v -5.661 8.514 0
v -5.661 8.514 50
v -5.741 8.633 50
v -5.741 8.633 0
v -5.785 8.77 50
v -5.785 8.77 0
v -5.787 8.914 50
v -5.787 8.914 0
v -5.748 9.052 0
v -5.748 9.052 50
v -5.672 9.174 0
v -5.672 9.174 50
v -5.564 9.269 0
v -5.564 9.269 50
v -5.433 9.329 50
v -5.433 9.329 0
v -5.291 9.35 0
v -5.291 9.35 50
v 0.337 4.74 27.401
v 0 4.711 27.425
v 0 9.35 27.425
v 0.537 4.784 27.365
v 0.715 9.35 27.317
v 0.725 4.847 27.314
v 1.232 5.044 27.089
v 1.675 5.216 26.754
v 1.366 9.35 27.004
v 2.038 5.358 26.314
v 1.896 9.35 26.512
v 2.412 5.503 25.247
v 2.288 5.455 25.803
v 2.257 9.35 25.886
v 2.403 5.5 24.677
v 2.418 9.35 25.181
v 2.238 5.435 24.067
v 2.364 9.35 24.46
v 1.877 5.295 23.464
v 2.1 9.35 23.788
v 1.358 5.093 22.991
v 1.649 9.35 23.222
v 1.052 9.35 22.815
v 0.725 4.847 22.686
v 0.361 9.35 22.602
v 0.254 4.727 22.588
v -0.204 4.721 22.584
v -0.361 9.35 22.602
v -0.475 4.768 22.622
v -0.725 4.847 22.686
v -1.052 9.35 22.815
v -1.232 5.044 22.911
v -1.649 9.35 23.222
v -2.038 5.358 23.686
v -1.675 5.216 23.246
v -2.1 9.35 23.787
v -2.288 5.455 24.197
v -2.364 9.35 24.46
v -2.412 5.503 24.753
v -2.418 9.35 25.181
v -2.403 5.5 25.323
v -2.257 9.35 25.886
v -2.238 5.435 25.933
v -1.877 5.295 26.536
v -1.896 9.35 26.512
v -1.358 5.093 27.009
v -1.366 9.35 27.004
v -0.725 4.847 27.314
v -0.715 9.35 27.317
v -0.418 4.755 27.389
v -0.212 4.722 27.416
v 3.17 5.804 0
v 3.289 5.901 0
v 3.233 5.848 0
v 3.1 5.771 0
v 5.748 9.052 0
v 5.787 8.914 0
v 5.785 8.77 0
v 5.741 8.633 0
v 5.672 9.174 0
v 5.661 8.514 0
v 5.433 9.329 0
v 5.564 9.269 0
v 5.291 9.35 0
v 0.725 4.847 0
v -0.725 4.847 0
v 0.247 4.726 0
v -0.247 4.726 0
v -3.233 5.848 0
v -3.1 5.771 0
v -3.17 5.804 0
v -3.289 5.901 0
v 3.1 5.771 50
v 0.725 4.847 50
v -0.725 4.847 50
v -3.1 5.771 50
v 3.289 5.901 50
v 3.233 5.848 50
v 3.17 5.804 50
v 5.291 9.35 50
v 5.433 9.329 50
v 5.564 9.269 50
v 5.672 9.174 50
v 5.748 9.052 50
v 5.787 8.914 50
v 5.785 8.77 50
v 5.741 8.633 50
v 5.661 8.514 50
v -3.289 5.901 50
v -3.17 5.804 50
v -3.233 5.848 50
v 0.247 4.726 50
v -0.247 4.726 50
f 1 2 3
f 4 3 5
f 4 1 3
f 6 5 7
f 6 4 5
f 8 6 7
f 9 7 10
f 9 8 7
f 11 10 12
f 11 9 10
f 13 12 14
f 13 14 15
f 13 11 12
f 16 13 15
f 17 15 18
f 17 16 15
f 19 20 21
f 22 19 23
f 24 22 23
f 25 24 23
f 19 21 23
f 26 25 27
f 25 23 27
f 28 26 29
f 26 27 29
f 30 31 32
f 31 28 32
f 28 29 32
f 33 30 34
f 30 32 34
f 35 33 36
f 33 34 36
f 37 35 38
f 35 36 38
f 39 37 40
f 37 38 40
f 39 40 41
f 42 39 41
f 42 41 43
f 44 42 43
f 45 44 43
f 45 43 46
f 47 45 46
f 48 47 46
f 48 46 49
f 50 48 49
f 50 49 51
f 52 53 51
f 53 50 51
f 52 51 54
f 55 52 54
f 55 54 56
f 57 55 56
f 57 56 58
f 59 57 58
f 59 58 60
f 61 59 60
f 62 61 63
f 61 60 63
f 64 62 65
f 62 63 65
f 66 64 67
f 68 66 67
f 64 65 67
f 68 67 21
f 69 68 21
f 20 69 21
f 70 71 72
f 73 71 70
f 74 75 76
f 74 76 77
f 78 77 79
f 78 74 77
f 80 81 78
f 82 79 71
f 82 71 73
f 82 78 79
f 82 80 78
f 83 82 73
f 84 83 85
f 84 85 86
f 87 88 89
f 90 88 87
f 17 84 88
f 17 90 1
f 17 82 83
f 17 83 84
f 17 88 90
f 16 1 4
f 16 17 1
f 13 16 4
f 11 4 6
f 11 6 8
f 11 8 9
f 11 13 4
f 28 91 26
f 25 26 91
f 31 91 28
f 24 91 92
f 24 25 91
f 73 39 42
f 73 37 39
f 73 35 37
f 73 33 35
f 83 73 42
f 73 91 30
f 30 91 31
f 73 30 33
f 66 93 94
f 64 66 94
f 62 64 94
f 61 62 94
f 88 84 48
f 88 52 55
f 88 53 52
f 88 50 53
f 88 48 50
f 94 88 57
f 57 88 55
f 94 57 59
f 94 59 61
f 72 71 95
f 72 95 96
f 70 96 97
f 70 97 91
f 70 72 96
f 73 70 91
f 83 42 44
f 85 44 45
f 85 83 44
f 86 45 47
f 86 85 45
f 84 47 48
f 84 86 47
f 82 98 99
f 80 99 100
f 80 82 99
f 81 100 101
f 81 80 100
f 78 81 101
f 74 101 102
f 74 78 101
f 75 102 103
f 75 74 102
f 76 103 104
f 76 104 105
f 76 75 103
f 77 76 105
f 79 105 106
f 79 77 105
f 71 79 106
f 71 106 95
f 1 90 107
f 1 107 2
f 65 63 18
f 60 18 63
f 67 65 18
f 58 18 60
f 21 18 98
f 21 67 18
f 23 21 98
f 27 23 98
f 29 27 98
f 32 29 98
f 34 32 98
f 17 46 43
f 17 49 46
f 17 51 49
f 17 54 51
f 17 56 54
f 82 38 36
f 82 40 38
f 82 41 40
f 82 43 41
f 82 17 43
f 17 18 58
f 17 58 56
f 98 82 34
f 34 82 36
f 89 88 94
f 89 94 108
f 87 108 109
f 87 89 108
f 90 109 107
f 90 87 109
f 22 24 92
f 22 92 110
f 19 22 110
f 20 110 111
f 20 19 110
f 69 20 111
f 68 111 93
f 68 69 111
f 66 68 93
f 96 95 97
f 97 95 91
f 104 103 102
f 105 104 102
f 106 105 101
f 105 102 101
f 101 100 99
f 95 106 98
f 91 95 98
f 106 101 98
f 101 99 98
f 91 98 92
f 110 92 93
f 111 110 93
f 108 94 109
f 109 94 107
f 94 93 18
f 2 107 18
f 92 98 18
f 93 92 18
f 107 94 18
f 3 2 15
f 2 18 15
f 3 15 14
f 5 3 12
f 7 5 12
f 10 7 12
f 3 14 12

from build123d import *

# Parameters (mm, degrees)
BOSS_EXTRUDE1_DEPTH = 50
SKETCH3_R           = 2.425
CUT_EXTRUDE1_DEPTH  = 51.547558199


with BuildPart() as part:
    # Sketch2 → Boss-Extrude1 (new body)
    with BuildSketch(Plane.XY):
        with BuildLine():
            Line((-5.290927929, 9.35), (5.290927929, 9.35))
            ThreePointArc((5.290927929, 9.35), (5.748105268, 9.052457111), (5.661163141, 8.513955526))
            Line((5.661163141, 8.513955526), (3.289191157, 5.900648009))
            ThreePointArc((3.289191157, 5.900648009), (3.202240303, 5.824685234), (3.100183828, 5.770691994))
            Line((3.100183828, 5.770691994), (0.724911529, 4.846947106))
            ThreePointArc((0.724911529, 4.846947106), (0, 4.710949058), (-0.724911529, 4.846947106))
            Line((-0.724911529, 4.846947106), (-3.100183828, 5.770691994))
            ThreePointArc((-3.100183828, 5.770691994), (-3.202240303, 5.824685234), (-3.289191157, 5.900648009))
            Line((-3.289191157, 5.900648009), (-5.661163141, 8.513955526))
            ThreePointArc((-5.661163141, 8.513955526), (-5.748105268, 9.052457111), (-5.290927929, 9.35))
        make_face()
    extrude(amount=BOSS_EXTRUDE1_DEPTH)

    # Sketch3 → Cut-Extrude1 (cut, through all)
    with BuildSketch(Plane(origin=(0, 9.35, 0), x_dir=(1, 0, 0), z_dir=(0, 1, 0))):
        with Locations(Location((0, -25, 0), (0, 0, 270))):
            Circle(SKETCH3_R)
    extrude(amount=-CUT_EXTRUDE1_DEPTH, mode=Mode.SUBTRACT)


solid = part.part
